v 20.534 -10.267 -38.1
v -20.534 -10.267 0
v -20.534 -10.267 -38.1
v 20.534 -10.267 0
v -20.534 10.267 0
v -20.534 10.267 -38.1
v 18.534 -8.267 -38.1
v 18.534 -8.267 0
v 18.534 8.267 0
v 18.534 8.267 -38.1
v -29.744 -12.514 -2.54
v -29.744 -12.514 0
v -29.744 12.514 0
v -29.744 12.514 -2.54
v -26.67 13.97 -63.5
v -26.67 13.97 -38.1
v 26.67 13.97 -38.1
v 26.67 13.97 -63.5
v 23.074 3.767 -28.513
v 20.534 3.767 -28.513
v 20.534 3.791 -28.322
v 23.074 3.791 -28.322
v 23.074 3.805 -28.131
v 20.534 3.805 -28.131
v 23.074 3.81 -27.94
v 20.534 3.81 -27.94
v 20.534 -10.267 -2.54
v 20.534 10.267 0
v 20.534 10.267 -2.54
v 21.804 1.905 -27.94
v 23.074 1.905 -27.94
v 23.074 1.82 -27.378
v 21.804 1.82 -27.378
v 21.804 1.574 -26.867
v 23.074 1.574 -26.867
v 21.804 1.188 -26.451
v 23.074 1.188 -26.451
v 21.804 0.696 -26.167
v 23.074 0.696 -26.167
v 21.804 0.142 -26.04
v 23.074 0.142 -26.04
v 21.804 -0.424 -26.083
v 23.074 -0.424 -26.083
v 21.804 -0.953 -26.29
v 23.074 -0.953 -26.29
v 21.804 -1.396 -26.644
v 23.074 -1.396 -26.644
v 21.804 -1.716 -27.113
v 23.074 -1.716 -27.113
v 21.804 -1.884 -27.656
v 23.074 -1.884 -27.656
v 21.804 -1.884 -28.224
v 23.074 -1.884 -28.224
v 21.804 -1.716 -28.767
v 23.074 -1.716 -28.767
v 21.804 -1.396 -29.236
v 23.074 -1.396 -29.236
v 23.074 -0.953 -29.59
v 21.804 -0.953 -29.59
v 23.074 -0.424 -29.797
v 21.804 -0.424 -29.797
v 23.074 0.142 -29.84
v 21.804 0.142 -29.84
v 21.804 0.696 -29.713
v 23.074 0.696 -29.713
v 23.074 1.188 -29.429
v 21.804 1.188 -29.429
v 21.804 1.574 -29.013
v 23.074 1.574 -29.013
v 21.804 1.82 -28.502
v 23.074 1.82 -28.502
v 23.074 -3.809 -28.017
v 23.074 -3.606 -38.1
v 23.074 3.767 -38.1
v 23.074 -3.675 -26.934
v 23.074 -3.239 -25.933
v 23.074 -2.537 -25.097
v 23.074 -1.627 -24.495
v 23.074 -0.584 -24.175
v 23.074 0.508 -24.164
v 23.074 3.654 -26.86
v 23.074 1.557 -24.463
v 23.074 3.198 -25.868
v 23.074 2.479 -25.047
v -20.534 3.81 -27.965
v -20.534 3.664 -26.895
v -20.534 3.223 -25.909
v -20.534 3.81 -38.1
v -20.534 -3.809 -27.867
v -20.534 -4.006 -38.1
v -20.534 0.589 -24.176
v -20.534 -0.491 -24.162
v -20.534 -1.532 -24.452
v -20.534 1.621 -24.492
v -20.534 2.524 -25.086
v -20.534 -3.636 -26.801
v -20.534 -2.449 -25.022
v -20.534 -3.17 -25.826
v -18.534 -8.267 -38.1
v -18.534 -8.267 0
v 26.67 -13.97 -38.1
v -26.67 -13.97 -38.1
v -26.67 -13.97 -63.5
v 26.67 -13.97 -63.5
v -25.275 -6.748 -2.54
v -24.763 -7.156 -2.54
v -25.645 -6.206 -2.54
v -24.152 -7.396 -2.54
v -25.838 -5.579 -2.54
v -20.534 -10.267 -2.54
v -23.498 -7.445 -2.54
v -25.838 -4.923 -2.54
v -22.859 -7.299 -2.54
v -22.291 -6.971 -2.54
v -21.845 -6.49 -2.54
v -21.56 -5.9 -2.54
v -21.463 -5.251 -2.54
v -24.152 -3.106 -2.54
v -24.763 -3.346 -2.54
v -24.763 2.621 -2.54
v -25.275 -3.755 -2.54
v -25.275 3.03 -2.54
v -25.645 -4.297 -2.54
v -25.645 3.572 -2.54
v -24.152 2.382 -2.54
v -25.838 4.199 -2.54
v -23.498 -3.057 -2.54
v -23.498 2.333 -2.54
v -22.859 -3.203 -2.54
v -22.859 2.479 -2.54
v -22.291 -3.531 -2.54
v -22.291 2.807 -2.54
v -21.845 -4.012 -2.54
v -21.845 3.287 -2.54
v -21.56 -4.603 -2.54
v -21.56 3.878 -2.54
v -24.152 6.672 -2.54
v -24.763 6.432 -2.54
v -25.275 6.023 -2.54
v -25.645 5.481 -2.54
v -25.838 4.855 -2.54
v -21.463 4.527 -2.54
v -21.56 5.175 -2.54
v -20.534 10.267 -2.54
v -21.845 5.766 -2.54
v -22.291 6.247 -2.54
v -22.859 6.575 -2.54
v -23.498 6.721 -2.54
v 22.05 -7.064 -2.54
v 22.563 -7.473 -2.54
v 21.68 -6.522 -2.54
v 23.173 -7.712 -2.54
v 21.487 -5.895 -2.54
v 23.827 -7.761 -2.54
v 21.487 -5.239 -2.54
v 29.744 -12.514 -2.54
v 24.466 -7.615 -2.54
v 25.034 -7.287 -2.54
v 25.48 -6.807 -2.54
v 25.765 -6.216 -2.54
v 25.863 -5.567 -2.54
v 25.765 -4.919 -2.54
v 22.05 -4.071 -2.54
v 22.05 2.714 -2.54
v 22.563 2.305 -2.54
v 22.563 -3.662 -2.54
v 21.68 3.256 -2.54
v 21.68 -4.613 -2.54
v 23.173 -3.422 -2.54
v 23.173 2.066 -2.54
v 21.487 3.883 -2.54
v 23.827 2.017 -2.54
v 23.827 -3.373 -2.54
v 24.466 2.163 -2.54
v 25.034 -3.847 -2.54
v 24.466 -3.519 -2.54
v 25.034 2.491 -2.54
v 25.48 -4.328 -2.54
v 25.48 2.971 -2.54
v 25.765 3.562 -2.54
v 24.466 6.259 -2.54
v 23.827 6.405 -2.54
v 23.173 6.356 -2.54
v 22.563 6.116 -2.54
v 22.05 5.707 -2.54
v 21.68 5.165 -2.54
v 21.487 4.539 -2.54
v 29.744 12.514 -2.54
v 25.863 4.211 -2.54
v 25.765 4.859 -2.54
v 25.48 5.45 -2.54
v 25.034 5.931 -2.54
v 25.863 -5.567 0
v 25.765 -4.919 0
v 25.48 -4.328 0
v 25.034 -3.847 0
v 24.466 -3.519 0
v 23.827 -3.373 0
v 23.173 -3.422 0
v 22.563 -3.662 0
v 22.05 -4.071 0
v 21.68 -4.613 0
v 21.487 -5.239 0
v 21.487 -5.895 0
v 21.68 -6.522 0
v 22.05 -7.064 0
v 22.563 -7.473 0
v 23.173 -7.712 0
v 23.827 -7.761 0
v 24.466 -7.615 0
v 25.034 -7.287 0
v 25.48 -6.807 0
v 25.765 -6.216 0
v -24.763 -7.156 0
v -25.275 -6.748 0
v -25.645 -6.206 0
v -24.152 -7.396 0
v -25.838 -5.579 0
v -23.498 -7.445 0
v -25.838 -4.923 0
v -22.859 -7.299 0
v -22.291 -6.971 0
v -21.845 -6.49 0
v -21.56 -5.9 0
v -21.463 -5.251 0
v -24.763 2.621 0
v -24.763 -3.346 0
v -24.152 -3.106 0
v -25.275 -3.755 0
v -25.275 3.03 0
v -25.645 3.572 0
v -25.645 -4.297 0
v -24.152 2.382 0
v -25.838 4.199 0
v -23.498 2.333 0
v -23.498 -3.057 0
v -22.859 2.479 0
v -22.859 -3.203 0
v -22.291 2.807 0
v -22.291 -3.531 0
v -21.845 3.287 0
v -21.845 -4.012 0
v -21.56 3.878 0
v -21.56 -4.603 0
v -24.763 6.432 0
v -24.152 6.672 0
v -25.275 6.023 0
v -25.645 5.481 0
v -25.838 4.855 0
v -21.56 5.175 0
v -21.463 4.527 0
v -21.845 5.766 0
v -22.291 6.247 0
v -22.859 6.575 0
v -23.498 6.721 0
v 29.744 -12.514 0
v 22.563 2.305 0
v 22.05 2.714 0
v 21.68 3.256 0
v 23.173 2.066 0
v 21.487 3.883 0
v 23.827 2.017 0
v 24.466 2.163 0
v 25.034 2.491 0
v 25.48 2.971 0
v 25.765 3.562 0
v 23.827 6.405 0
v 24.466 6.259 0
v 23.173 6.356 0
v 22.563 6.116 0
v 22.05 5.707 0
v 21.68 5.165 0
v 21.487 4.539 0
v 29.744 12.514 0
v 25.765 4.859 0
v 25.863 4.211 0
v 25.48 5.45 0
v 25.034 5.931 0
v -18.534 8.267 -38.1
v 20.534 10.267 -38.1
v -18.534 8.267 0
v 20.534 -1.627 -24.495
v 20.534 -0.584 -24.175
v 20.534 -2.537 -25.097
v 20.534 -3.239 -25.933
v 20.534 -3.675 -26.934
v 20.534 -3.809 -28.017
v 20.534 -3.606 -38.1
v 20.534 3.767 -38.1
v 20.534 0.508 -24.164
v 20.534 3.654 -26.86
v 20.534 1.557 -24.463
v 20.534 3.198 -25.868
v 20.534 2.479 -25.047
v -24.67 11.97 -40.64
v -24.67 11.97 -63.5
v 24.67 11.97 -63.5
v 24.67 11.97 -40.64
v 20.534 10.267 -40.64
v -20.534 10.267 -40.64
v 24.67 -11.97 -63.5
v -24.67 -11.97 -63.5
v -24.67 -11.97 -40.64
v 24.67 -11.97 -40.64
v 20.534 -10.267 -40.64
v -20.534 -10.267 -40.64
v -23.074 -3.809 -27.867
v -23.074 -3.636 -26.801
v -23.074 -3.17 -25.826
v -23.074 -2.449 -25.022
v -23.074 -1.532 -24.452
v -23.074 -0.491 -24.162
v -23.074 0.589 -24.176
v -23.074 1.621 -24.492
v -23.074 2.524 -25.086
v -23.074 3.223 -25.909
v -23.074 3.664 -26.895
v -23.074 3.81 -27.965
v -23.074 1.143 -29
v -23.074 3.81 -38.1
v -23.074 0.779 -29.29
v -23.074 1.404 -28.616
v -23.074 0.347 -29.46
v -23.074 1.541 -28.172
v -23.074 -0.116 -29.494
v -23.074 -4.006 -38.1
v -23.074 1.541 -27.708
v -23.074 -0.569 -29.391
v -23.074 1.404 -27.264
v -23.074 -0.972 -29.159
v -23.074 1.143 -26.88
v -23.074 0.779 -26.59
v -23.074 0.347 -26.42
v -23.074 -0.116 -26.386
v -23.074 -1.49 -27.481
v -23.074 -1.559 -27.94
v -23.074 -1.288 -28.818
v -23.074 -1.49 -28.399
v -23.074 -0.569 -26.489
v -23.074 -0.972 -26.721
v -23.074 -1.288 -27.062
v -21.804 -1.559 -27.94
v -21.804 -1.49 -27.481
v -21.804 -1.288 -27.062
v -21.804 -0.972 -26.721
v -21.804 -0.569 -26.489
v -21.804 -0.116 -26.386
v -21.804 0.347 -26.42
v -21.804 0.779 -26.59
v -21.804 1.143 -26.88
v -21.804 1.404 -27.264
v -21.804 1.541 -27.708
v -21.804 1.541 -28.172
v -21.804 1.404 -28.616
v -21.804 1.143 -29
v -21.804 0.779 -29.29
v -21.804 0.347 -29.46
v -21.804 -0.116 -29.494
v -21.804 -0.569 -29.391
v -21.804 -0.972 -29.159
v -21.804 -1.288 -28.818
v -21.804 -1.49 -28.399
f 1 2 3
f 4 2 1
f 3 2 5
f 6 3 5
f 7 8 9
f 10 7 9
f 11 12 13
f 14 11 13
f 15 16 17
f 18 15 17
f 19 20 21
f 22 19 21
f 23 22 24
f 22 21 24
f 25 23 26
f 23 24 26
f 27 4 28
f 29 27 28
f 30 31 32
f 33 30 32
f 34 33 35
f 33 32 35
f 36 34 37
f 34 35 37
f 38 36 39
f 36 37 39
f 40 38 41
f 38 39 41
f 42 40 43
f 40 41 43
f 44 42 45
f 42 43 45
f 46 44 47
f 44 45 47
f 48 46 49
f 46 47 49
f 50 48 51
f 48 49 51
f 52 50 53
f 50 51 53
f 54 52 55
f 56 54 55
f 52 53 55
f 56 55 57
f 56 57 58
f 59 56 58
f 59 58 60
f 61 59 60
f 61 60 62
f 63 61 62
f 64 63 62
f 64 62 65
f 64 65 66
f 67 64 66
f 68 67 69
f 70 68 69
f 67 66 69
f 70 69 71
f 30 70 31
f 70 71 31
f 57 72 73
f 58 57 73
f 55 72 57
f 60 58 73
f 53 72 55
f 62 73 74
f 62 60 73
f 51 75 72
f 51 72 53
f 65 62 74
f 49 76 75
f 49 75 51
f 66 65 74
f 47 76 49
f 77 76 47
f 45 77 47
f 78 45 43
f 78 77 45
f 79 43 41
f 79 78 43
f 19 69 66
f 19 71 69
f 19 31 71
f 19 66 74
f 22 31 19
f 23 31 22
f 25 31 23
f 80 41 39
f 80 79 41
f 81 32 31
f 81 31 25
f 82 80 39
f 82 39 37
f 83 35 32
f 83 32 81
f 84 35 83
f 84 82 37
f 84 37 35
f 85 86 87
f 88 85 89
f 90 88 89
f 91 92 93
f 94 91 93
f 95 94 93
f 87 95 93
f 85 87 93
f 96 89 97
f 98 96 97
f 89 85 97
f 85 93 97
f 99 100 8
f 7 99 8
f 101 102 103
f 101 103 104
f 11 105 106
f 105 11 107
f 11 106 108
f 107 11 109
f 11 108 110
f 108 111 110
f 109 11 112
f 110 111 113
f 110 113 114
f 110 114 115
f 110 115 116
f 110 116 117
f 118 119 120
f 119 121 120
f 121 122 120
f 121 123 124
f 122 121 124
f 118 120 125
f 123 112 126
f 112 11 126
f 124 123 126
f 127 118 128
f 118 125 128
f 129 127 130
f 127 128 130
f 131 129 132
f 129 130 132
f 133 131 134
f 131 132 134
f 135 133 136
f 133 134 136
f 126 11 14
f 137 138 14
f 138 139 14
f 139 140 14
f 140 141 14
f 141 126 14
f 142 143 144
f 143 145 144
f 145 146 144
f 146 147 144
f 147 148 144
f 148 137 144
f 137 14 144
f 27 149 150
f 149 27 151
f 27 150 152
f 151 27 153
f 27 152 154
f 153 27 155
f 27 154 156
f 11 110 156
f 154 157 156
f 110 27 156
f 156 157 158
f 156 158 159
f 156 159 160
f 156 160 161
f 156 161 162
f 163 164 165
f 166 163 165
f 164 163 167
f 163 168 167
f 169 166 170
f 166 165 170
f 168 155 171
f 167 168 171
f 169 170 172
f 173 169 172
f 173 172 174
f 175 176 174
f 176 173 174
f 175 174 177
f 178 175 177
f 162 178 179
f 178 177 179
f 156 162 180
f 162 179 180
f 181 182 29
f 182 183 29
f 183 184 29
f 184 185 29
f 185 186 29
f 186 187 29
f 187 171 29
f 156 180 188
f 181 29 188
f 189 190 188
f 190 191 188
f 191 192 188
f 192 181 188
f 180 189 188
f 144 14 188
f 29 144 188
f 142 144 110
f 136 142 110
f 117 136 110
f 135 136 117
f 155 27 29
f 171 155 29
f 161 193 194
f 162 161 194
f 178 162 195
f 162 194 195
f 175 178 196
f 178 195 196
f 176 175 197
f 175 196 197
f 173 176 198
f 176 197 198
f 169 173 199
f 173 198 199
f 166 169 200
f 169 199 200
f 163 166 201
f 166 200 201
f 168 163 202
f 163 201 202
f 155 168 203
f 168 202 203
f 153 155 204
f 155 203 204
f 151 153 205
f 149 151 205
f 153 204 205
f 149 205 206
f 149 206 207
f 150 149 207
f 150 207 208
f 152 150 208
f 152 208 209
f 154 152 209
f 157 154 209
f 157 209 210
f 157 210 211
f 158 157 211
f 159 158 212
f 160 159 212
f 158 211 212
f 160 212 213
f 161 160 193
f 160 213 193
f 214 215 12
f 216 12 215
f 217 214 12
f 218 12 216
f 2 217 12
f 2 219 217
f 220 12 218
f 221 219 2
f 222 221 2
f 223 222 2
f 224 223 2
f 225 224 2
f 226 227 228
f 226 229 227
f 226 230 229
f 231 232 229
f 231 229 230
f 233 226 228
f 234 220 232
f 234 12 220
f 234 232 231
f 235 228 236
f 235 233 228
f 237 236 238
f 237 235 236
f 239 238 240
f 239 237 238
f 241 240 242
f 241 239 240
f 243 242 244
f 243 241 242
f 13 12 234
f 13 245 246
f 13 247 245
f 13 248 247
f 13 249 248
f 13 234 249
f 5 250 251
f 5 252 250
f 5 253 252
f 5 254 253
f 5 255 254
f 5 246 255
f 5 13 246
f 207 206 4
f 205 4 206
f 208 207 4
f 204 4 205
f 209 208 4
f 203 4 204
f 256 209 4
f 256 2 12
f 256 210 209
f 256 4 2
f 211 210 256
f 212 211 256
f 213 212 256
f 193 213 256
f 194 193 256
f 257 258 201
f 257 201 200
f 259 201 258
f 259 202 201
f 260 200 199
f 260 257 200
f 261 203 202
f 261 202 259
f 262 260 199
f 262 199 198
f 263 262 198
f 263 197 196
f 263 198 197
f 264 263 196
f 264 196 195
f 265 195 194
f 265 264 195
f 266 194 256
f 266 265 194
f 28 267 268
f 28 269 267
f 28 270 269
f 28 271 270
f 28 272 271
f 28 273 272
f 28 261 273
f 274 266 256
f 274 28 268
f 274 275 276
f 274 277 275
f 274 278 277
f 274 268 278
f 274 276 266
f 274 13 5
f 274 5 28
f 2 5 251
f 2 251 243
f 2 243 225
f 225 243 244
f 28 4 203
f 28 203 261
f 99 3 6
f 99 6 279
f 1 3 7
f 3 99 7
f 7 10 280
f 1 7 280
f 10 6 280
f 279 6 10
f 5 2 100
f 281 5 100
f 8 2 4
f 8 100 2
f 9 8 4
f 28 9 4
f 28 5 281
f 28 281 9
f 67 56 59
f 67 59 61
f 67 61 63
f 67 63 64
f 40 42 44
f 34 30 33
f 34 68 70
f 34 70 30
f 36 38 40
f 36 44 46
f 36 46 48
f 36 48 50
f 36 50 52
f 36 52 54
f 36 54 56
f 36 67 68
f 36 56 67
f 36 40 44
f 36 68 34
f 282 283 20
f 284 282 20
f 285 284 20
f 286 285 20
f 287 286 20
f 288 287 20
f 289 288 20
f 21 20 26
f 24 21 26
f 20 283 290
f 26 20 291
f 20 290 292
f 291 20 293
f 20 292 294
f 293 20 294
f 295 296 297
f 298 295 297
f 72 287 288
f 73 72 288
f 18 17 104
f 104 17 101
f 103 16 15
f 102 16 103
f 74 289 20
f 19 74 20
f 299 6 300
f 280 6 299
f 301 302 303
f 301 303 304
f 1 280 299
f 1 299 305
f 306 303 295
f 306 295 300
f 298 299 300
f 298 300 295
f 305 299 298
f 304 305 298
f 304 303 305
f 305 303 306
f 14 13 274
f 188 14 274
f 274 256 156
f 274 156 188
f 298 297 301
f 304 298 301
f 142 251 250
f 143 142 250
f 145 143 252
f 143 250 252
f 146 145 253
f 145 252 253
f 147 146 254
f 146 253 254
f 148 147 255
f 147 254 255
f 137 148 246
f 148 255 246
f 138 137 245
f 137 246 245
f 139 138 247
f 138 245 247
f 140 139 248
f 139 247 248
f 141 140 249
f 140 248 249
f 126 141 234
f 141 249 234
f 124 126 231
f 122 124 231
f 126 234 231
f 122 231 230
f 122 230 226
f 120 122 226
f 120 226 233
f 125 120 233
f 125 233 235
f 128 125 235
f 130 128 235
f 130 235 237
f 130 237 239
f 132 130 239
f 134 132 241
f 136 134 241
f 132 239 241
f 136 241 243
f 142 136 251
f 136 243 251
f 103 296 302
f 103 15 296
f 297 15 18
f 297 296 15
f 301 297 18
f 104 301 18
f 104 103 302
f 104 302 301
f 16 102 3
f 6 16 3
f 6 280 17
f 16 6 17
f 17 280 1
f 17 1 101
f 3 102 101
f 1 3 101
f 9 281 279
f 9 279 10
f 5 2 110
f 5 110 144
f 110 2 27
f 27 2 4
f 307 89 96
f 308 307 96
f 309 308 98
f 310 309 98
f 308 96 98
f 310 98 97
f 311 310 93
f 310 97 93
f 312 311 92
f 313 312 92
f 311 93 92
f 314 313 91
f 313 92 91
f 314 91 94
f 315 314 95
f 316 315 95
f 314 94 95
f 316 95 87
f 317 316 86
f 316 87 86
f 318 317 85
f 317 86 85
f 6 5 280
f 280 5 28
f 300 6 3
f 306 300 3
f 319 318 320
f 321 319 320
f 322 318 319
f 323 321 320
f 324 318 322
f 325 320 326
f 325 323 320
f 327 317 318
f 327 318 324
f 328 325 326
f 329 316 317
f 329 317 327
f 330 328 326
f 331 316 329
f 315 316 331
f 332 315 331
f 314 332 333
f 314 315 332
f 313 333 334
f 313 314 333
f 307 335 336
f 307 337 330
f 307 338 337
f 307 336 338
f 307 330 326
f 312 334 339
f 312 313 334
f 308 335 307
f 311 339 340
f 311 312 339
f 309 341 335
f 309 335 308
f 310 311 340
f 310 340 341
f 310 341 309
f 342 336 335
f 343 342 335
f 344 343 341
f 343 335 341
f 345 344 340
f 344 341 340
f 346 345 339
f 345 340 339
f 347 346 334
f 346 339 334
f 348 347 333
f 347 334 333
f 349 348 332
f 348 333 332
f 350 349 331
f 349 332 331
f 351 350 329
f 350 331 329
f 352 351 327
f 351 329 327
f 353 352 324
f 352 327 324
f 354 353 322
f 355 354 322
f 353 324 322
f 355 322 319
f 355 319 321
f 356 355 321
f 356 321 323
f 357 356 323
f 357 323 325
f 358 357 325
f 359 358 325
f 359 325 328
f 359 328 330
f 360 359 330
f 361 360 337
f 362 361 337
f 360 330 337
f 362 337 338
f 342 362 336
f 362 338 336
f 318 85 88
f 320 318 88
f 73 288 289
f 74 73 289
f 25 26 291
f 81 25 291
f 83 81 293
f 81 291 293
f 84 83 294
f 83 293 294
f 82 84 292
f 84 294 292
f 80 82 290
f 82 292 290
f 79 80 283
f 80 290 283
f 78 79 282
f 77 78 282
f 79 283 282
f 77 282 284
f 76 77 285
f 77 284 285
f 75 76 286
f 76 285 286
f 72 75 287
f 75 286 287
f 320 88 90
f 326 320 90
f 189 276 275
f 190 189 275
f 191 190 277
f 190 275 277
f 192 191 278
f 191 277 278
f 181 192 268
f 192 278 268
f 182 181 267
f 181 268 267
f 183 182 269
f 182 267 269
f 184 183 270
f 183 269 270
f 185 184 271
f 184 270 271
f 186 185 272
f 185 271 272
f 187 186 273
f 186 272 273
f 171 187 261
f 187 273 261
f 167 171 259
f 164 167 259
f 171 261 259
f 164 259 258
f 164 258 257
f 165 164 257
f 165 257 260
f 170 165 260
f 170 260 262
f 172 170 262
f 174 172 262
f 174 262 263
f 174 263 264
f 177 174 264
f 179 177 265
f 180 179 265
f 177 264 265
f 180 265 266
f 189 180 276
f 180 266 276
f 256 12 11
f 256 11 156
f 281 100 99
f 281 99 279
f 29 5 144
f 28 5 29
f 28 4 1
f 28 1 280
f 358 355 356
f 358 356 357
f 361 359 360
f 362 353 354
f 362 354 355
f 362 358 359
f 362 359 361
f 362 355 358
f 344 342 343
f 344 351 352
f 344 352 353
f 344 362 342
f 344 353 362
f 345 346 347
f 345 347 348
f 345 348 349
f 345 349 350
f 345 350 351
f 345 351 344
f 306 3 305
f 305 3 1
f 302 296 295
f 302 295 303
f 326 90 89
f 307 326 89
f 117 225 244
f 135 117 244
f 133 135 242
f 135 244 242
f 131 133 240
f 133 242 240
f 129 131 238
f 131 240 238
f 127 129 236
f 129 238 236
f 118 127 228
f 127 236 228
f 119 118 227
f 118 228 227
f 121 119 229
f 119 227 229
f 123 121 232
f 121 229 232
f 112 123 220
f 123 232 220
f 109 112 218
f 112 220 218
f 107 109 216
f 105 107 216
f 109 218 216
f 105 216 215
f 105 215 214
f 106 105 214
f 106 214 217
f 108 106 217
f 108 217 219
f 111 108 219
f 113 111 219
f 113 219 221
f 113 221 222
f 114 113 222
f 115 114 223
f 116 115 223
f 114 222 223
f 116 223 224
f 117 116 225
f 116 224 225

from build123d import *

# Parameters (mm, degrees)
F0_W      = 41.0674
F0_H      = 20.5337
F1_DEPTH  = 38.1
F2_W      = 53.34
F2_H      = 27.94
F2_W_2    = 41.0674
F2_H_2    = 20.5337
F3_DEPTH  = 25.4
F5_DEPTH  = 2.54
F6_R      = 1.558786
F7_DEPTH  = 1.27
F9_DEPTH  = 2.54
F10_R     = 1.905
F11_DEPTH = 1.27
F12_W     = 59.488534
F12_H     = 25.028098
F12_R     = 2.20005
F12_W_2   = 41.0674
F12_H_2   = 20.5337
F13_DEPTH = 2.54
F14_W     = 37.0674
F14_H     = 16.5337
F15_DEPTH = 63.501
F16_W     = 49.34
F16_H     = 23.94
F17_DEPTH = 22.86


with BuildPart() as f1:
    # F0 (on Top) → F1 (new body)
    with BuildSketch(Plane.XY):
        Rectangle(F0_W, F0_H)
    extrude(amount=-F1_DEPTH)

    # F14 (on face) → F15 (cut, through all)
    with BuildSketch(Plane.XY):
        Rectangle(F14_W, F14_H)
    extrude(amount=-F15_DEPTH, mode=Mode.SUBTRACT)


with BuildPart() as f3:
    # F2 (on face) → F3 (new body)
    with BuildSketch(Plane(origin=(0, 0, -38.1), x_dir=(1, 0, 0), z_dir=(0, 0, -1))):
        Rectangle(F2_W, F2_H)
        Rectangle(F2_W_2, F2_H_2, mode=Mode.SUBTRACT)
    extrude(amount=F3_DEPTH)

    # F16 (on face) → F17 (cut)
    with BuildSketch(Plane(origin=(0, 0, -63.5), x_dir=(1, 0, 0), z_dir=(0, 0, -1))):
        Rectangle(F16_W, F16_H)
    extrude(amount=-F17_DEPTH, mode=Mode.SUBTRACT)


with BuildPart() as f5:
    # F4 (on face) → F5 (new body)
    with BuildSketch(Plane(origin=(-20.5337, 0, 0), x_dir=(0, -1, 0), z_dir=(-1, 0, 0))):
        with BuildLine():
            ThreePointArc((3.809298, -27.866879), (3.809825, -27.903438), (3.81, -27.94))
            ThreePointArc((3.81, -27.94), (0.012455, -31.74998), (-3.809919, -27.964911))
            Line((-3.809919, -27.964911), (-3.809919, -38.1))
            Line((-3.809919, -38.1), (4.005727, -38.1))
            Line((4.005727, -38.1), (3.809298, -27.866879))
        make_face()
        with BuildLine():
            ThreePointArc((-3.809919, -27.964911), (0.012455, -31.74998), (3.81, -27.94))
            ThreePointArc((3.81, -27.94), (3.809825, -27.903438), (3.809298, -27.866879))
            ThreePointArc((3.809298, -27.866879), (-0.049017, -24.130315), (-3.809919, -27.964911))
        make_face()
    extrude(amount=F5_DEPTH)

    # F6 (on face) → F7 (cut)
    with BuildSketch(Plane(origin=(-23.0737, 0, 0), x_dir=(0, -1, 0), z_dir=(-1, 0, 0))):
        with Locations((0, -27.94)):
            Circle(F6_R)
    extrude(amount=-F7_DEPTH, mode=Mode.SUBTRACT)


with BuildPart() as f9:
    # F8 (on face) → F9 (new body)
    with BuildSketch(Plane.YZ.offset(20.5337)):
        with BuildLine():
            ThreePointArc((3.76674, -28.512511), (3.79917, -28.227071), (3.81, -27.94))
            ThreePointArc((3.81, -27.94), (-0.038418, -24.130194), (-3.809225, -28.016832))
            ThreePointArc((-3.809225, -28.016832), (-0.248748, -31.741871), (3.76674, -28.512511))
        make_face()
        with BuildLine():
            ThreePointArc((3.76674, -28.512511), (-0.248748, -31.741871), (-3.809225, -28.016832))
            Line((-3.809225, -28.016832), (-3.605847, -38.1))
            Line((-3.605847, -38.1), (3.76674, -38.1))
            Line((3.76674, -38.1), (3.76674, -28.512511))
        make_face()
    extrude(amount=F9_DEPTH)

    # F10 (on face) → F11 (cut)
    with BuildSketch(Plane.YZ.offset(23.0737)):
        with Locations((0, -27.94)):
            Circle(F10_R)
    extrude(amount=-F11_DEPTH, mode=Mode.SUBTRACT)


with BuildPart() as f13:
    # F12 (on face) → F13 (new body)
    with BuildSketch(Plane.XY):
        Rectangle(F12_W, F12_H)
        with Locations((-23.6626, -5.25112)):
            Circle(F12_R, mode=Mode.SUBTRACT)
        with Locations((23.6626, -5.567208)):
            Circle(F12_R, mode=Mode.SUBTRACT)
        with Locations((-23.6626, 4.52678)):
            Circle(F12_R, mode=Mode.SUBTRACT)
        Rectangle(F12_W_2, F12_H_2, mode=Mode.SUBTRACT)
        with Locations((23.6626, 4.210692)):
            Circle(F12_R, mode=Mode.SUBTRACT)
    extrude(amount=-F13_DEPTH)


solid = Compound([f1.part, f3.part, f5.part, f9.part, f13.part])
